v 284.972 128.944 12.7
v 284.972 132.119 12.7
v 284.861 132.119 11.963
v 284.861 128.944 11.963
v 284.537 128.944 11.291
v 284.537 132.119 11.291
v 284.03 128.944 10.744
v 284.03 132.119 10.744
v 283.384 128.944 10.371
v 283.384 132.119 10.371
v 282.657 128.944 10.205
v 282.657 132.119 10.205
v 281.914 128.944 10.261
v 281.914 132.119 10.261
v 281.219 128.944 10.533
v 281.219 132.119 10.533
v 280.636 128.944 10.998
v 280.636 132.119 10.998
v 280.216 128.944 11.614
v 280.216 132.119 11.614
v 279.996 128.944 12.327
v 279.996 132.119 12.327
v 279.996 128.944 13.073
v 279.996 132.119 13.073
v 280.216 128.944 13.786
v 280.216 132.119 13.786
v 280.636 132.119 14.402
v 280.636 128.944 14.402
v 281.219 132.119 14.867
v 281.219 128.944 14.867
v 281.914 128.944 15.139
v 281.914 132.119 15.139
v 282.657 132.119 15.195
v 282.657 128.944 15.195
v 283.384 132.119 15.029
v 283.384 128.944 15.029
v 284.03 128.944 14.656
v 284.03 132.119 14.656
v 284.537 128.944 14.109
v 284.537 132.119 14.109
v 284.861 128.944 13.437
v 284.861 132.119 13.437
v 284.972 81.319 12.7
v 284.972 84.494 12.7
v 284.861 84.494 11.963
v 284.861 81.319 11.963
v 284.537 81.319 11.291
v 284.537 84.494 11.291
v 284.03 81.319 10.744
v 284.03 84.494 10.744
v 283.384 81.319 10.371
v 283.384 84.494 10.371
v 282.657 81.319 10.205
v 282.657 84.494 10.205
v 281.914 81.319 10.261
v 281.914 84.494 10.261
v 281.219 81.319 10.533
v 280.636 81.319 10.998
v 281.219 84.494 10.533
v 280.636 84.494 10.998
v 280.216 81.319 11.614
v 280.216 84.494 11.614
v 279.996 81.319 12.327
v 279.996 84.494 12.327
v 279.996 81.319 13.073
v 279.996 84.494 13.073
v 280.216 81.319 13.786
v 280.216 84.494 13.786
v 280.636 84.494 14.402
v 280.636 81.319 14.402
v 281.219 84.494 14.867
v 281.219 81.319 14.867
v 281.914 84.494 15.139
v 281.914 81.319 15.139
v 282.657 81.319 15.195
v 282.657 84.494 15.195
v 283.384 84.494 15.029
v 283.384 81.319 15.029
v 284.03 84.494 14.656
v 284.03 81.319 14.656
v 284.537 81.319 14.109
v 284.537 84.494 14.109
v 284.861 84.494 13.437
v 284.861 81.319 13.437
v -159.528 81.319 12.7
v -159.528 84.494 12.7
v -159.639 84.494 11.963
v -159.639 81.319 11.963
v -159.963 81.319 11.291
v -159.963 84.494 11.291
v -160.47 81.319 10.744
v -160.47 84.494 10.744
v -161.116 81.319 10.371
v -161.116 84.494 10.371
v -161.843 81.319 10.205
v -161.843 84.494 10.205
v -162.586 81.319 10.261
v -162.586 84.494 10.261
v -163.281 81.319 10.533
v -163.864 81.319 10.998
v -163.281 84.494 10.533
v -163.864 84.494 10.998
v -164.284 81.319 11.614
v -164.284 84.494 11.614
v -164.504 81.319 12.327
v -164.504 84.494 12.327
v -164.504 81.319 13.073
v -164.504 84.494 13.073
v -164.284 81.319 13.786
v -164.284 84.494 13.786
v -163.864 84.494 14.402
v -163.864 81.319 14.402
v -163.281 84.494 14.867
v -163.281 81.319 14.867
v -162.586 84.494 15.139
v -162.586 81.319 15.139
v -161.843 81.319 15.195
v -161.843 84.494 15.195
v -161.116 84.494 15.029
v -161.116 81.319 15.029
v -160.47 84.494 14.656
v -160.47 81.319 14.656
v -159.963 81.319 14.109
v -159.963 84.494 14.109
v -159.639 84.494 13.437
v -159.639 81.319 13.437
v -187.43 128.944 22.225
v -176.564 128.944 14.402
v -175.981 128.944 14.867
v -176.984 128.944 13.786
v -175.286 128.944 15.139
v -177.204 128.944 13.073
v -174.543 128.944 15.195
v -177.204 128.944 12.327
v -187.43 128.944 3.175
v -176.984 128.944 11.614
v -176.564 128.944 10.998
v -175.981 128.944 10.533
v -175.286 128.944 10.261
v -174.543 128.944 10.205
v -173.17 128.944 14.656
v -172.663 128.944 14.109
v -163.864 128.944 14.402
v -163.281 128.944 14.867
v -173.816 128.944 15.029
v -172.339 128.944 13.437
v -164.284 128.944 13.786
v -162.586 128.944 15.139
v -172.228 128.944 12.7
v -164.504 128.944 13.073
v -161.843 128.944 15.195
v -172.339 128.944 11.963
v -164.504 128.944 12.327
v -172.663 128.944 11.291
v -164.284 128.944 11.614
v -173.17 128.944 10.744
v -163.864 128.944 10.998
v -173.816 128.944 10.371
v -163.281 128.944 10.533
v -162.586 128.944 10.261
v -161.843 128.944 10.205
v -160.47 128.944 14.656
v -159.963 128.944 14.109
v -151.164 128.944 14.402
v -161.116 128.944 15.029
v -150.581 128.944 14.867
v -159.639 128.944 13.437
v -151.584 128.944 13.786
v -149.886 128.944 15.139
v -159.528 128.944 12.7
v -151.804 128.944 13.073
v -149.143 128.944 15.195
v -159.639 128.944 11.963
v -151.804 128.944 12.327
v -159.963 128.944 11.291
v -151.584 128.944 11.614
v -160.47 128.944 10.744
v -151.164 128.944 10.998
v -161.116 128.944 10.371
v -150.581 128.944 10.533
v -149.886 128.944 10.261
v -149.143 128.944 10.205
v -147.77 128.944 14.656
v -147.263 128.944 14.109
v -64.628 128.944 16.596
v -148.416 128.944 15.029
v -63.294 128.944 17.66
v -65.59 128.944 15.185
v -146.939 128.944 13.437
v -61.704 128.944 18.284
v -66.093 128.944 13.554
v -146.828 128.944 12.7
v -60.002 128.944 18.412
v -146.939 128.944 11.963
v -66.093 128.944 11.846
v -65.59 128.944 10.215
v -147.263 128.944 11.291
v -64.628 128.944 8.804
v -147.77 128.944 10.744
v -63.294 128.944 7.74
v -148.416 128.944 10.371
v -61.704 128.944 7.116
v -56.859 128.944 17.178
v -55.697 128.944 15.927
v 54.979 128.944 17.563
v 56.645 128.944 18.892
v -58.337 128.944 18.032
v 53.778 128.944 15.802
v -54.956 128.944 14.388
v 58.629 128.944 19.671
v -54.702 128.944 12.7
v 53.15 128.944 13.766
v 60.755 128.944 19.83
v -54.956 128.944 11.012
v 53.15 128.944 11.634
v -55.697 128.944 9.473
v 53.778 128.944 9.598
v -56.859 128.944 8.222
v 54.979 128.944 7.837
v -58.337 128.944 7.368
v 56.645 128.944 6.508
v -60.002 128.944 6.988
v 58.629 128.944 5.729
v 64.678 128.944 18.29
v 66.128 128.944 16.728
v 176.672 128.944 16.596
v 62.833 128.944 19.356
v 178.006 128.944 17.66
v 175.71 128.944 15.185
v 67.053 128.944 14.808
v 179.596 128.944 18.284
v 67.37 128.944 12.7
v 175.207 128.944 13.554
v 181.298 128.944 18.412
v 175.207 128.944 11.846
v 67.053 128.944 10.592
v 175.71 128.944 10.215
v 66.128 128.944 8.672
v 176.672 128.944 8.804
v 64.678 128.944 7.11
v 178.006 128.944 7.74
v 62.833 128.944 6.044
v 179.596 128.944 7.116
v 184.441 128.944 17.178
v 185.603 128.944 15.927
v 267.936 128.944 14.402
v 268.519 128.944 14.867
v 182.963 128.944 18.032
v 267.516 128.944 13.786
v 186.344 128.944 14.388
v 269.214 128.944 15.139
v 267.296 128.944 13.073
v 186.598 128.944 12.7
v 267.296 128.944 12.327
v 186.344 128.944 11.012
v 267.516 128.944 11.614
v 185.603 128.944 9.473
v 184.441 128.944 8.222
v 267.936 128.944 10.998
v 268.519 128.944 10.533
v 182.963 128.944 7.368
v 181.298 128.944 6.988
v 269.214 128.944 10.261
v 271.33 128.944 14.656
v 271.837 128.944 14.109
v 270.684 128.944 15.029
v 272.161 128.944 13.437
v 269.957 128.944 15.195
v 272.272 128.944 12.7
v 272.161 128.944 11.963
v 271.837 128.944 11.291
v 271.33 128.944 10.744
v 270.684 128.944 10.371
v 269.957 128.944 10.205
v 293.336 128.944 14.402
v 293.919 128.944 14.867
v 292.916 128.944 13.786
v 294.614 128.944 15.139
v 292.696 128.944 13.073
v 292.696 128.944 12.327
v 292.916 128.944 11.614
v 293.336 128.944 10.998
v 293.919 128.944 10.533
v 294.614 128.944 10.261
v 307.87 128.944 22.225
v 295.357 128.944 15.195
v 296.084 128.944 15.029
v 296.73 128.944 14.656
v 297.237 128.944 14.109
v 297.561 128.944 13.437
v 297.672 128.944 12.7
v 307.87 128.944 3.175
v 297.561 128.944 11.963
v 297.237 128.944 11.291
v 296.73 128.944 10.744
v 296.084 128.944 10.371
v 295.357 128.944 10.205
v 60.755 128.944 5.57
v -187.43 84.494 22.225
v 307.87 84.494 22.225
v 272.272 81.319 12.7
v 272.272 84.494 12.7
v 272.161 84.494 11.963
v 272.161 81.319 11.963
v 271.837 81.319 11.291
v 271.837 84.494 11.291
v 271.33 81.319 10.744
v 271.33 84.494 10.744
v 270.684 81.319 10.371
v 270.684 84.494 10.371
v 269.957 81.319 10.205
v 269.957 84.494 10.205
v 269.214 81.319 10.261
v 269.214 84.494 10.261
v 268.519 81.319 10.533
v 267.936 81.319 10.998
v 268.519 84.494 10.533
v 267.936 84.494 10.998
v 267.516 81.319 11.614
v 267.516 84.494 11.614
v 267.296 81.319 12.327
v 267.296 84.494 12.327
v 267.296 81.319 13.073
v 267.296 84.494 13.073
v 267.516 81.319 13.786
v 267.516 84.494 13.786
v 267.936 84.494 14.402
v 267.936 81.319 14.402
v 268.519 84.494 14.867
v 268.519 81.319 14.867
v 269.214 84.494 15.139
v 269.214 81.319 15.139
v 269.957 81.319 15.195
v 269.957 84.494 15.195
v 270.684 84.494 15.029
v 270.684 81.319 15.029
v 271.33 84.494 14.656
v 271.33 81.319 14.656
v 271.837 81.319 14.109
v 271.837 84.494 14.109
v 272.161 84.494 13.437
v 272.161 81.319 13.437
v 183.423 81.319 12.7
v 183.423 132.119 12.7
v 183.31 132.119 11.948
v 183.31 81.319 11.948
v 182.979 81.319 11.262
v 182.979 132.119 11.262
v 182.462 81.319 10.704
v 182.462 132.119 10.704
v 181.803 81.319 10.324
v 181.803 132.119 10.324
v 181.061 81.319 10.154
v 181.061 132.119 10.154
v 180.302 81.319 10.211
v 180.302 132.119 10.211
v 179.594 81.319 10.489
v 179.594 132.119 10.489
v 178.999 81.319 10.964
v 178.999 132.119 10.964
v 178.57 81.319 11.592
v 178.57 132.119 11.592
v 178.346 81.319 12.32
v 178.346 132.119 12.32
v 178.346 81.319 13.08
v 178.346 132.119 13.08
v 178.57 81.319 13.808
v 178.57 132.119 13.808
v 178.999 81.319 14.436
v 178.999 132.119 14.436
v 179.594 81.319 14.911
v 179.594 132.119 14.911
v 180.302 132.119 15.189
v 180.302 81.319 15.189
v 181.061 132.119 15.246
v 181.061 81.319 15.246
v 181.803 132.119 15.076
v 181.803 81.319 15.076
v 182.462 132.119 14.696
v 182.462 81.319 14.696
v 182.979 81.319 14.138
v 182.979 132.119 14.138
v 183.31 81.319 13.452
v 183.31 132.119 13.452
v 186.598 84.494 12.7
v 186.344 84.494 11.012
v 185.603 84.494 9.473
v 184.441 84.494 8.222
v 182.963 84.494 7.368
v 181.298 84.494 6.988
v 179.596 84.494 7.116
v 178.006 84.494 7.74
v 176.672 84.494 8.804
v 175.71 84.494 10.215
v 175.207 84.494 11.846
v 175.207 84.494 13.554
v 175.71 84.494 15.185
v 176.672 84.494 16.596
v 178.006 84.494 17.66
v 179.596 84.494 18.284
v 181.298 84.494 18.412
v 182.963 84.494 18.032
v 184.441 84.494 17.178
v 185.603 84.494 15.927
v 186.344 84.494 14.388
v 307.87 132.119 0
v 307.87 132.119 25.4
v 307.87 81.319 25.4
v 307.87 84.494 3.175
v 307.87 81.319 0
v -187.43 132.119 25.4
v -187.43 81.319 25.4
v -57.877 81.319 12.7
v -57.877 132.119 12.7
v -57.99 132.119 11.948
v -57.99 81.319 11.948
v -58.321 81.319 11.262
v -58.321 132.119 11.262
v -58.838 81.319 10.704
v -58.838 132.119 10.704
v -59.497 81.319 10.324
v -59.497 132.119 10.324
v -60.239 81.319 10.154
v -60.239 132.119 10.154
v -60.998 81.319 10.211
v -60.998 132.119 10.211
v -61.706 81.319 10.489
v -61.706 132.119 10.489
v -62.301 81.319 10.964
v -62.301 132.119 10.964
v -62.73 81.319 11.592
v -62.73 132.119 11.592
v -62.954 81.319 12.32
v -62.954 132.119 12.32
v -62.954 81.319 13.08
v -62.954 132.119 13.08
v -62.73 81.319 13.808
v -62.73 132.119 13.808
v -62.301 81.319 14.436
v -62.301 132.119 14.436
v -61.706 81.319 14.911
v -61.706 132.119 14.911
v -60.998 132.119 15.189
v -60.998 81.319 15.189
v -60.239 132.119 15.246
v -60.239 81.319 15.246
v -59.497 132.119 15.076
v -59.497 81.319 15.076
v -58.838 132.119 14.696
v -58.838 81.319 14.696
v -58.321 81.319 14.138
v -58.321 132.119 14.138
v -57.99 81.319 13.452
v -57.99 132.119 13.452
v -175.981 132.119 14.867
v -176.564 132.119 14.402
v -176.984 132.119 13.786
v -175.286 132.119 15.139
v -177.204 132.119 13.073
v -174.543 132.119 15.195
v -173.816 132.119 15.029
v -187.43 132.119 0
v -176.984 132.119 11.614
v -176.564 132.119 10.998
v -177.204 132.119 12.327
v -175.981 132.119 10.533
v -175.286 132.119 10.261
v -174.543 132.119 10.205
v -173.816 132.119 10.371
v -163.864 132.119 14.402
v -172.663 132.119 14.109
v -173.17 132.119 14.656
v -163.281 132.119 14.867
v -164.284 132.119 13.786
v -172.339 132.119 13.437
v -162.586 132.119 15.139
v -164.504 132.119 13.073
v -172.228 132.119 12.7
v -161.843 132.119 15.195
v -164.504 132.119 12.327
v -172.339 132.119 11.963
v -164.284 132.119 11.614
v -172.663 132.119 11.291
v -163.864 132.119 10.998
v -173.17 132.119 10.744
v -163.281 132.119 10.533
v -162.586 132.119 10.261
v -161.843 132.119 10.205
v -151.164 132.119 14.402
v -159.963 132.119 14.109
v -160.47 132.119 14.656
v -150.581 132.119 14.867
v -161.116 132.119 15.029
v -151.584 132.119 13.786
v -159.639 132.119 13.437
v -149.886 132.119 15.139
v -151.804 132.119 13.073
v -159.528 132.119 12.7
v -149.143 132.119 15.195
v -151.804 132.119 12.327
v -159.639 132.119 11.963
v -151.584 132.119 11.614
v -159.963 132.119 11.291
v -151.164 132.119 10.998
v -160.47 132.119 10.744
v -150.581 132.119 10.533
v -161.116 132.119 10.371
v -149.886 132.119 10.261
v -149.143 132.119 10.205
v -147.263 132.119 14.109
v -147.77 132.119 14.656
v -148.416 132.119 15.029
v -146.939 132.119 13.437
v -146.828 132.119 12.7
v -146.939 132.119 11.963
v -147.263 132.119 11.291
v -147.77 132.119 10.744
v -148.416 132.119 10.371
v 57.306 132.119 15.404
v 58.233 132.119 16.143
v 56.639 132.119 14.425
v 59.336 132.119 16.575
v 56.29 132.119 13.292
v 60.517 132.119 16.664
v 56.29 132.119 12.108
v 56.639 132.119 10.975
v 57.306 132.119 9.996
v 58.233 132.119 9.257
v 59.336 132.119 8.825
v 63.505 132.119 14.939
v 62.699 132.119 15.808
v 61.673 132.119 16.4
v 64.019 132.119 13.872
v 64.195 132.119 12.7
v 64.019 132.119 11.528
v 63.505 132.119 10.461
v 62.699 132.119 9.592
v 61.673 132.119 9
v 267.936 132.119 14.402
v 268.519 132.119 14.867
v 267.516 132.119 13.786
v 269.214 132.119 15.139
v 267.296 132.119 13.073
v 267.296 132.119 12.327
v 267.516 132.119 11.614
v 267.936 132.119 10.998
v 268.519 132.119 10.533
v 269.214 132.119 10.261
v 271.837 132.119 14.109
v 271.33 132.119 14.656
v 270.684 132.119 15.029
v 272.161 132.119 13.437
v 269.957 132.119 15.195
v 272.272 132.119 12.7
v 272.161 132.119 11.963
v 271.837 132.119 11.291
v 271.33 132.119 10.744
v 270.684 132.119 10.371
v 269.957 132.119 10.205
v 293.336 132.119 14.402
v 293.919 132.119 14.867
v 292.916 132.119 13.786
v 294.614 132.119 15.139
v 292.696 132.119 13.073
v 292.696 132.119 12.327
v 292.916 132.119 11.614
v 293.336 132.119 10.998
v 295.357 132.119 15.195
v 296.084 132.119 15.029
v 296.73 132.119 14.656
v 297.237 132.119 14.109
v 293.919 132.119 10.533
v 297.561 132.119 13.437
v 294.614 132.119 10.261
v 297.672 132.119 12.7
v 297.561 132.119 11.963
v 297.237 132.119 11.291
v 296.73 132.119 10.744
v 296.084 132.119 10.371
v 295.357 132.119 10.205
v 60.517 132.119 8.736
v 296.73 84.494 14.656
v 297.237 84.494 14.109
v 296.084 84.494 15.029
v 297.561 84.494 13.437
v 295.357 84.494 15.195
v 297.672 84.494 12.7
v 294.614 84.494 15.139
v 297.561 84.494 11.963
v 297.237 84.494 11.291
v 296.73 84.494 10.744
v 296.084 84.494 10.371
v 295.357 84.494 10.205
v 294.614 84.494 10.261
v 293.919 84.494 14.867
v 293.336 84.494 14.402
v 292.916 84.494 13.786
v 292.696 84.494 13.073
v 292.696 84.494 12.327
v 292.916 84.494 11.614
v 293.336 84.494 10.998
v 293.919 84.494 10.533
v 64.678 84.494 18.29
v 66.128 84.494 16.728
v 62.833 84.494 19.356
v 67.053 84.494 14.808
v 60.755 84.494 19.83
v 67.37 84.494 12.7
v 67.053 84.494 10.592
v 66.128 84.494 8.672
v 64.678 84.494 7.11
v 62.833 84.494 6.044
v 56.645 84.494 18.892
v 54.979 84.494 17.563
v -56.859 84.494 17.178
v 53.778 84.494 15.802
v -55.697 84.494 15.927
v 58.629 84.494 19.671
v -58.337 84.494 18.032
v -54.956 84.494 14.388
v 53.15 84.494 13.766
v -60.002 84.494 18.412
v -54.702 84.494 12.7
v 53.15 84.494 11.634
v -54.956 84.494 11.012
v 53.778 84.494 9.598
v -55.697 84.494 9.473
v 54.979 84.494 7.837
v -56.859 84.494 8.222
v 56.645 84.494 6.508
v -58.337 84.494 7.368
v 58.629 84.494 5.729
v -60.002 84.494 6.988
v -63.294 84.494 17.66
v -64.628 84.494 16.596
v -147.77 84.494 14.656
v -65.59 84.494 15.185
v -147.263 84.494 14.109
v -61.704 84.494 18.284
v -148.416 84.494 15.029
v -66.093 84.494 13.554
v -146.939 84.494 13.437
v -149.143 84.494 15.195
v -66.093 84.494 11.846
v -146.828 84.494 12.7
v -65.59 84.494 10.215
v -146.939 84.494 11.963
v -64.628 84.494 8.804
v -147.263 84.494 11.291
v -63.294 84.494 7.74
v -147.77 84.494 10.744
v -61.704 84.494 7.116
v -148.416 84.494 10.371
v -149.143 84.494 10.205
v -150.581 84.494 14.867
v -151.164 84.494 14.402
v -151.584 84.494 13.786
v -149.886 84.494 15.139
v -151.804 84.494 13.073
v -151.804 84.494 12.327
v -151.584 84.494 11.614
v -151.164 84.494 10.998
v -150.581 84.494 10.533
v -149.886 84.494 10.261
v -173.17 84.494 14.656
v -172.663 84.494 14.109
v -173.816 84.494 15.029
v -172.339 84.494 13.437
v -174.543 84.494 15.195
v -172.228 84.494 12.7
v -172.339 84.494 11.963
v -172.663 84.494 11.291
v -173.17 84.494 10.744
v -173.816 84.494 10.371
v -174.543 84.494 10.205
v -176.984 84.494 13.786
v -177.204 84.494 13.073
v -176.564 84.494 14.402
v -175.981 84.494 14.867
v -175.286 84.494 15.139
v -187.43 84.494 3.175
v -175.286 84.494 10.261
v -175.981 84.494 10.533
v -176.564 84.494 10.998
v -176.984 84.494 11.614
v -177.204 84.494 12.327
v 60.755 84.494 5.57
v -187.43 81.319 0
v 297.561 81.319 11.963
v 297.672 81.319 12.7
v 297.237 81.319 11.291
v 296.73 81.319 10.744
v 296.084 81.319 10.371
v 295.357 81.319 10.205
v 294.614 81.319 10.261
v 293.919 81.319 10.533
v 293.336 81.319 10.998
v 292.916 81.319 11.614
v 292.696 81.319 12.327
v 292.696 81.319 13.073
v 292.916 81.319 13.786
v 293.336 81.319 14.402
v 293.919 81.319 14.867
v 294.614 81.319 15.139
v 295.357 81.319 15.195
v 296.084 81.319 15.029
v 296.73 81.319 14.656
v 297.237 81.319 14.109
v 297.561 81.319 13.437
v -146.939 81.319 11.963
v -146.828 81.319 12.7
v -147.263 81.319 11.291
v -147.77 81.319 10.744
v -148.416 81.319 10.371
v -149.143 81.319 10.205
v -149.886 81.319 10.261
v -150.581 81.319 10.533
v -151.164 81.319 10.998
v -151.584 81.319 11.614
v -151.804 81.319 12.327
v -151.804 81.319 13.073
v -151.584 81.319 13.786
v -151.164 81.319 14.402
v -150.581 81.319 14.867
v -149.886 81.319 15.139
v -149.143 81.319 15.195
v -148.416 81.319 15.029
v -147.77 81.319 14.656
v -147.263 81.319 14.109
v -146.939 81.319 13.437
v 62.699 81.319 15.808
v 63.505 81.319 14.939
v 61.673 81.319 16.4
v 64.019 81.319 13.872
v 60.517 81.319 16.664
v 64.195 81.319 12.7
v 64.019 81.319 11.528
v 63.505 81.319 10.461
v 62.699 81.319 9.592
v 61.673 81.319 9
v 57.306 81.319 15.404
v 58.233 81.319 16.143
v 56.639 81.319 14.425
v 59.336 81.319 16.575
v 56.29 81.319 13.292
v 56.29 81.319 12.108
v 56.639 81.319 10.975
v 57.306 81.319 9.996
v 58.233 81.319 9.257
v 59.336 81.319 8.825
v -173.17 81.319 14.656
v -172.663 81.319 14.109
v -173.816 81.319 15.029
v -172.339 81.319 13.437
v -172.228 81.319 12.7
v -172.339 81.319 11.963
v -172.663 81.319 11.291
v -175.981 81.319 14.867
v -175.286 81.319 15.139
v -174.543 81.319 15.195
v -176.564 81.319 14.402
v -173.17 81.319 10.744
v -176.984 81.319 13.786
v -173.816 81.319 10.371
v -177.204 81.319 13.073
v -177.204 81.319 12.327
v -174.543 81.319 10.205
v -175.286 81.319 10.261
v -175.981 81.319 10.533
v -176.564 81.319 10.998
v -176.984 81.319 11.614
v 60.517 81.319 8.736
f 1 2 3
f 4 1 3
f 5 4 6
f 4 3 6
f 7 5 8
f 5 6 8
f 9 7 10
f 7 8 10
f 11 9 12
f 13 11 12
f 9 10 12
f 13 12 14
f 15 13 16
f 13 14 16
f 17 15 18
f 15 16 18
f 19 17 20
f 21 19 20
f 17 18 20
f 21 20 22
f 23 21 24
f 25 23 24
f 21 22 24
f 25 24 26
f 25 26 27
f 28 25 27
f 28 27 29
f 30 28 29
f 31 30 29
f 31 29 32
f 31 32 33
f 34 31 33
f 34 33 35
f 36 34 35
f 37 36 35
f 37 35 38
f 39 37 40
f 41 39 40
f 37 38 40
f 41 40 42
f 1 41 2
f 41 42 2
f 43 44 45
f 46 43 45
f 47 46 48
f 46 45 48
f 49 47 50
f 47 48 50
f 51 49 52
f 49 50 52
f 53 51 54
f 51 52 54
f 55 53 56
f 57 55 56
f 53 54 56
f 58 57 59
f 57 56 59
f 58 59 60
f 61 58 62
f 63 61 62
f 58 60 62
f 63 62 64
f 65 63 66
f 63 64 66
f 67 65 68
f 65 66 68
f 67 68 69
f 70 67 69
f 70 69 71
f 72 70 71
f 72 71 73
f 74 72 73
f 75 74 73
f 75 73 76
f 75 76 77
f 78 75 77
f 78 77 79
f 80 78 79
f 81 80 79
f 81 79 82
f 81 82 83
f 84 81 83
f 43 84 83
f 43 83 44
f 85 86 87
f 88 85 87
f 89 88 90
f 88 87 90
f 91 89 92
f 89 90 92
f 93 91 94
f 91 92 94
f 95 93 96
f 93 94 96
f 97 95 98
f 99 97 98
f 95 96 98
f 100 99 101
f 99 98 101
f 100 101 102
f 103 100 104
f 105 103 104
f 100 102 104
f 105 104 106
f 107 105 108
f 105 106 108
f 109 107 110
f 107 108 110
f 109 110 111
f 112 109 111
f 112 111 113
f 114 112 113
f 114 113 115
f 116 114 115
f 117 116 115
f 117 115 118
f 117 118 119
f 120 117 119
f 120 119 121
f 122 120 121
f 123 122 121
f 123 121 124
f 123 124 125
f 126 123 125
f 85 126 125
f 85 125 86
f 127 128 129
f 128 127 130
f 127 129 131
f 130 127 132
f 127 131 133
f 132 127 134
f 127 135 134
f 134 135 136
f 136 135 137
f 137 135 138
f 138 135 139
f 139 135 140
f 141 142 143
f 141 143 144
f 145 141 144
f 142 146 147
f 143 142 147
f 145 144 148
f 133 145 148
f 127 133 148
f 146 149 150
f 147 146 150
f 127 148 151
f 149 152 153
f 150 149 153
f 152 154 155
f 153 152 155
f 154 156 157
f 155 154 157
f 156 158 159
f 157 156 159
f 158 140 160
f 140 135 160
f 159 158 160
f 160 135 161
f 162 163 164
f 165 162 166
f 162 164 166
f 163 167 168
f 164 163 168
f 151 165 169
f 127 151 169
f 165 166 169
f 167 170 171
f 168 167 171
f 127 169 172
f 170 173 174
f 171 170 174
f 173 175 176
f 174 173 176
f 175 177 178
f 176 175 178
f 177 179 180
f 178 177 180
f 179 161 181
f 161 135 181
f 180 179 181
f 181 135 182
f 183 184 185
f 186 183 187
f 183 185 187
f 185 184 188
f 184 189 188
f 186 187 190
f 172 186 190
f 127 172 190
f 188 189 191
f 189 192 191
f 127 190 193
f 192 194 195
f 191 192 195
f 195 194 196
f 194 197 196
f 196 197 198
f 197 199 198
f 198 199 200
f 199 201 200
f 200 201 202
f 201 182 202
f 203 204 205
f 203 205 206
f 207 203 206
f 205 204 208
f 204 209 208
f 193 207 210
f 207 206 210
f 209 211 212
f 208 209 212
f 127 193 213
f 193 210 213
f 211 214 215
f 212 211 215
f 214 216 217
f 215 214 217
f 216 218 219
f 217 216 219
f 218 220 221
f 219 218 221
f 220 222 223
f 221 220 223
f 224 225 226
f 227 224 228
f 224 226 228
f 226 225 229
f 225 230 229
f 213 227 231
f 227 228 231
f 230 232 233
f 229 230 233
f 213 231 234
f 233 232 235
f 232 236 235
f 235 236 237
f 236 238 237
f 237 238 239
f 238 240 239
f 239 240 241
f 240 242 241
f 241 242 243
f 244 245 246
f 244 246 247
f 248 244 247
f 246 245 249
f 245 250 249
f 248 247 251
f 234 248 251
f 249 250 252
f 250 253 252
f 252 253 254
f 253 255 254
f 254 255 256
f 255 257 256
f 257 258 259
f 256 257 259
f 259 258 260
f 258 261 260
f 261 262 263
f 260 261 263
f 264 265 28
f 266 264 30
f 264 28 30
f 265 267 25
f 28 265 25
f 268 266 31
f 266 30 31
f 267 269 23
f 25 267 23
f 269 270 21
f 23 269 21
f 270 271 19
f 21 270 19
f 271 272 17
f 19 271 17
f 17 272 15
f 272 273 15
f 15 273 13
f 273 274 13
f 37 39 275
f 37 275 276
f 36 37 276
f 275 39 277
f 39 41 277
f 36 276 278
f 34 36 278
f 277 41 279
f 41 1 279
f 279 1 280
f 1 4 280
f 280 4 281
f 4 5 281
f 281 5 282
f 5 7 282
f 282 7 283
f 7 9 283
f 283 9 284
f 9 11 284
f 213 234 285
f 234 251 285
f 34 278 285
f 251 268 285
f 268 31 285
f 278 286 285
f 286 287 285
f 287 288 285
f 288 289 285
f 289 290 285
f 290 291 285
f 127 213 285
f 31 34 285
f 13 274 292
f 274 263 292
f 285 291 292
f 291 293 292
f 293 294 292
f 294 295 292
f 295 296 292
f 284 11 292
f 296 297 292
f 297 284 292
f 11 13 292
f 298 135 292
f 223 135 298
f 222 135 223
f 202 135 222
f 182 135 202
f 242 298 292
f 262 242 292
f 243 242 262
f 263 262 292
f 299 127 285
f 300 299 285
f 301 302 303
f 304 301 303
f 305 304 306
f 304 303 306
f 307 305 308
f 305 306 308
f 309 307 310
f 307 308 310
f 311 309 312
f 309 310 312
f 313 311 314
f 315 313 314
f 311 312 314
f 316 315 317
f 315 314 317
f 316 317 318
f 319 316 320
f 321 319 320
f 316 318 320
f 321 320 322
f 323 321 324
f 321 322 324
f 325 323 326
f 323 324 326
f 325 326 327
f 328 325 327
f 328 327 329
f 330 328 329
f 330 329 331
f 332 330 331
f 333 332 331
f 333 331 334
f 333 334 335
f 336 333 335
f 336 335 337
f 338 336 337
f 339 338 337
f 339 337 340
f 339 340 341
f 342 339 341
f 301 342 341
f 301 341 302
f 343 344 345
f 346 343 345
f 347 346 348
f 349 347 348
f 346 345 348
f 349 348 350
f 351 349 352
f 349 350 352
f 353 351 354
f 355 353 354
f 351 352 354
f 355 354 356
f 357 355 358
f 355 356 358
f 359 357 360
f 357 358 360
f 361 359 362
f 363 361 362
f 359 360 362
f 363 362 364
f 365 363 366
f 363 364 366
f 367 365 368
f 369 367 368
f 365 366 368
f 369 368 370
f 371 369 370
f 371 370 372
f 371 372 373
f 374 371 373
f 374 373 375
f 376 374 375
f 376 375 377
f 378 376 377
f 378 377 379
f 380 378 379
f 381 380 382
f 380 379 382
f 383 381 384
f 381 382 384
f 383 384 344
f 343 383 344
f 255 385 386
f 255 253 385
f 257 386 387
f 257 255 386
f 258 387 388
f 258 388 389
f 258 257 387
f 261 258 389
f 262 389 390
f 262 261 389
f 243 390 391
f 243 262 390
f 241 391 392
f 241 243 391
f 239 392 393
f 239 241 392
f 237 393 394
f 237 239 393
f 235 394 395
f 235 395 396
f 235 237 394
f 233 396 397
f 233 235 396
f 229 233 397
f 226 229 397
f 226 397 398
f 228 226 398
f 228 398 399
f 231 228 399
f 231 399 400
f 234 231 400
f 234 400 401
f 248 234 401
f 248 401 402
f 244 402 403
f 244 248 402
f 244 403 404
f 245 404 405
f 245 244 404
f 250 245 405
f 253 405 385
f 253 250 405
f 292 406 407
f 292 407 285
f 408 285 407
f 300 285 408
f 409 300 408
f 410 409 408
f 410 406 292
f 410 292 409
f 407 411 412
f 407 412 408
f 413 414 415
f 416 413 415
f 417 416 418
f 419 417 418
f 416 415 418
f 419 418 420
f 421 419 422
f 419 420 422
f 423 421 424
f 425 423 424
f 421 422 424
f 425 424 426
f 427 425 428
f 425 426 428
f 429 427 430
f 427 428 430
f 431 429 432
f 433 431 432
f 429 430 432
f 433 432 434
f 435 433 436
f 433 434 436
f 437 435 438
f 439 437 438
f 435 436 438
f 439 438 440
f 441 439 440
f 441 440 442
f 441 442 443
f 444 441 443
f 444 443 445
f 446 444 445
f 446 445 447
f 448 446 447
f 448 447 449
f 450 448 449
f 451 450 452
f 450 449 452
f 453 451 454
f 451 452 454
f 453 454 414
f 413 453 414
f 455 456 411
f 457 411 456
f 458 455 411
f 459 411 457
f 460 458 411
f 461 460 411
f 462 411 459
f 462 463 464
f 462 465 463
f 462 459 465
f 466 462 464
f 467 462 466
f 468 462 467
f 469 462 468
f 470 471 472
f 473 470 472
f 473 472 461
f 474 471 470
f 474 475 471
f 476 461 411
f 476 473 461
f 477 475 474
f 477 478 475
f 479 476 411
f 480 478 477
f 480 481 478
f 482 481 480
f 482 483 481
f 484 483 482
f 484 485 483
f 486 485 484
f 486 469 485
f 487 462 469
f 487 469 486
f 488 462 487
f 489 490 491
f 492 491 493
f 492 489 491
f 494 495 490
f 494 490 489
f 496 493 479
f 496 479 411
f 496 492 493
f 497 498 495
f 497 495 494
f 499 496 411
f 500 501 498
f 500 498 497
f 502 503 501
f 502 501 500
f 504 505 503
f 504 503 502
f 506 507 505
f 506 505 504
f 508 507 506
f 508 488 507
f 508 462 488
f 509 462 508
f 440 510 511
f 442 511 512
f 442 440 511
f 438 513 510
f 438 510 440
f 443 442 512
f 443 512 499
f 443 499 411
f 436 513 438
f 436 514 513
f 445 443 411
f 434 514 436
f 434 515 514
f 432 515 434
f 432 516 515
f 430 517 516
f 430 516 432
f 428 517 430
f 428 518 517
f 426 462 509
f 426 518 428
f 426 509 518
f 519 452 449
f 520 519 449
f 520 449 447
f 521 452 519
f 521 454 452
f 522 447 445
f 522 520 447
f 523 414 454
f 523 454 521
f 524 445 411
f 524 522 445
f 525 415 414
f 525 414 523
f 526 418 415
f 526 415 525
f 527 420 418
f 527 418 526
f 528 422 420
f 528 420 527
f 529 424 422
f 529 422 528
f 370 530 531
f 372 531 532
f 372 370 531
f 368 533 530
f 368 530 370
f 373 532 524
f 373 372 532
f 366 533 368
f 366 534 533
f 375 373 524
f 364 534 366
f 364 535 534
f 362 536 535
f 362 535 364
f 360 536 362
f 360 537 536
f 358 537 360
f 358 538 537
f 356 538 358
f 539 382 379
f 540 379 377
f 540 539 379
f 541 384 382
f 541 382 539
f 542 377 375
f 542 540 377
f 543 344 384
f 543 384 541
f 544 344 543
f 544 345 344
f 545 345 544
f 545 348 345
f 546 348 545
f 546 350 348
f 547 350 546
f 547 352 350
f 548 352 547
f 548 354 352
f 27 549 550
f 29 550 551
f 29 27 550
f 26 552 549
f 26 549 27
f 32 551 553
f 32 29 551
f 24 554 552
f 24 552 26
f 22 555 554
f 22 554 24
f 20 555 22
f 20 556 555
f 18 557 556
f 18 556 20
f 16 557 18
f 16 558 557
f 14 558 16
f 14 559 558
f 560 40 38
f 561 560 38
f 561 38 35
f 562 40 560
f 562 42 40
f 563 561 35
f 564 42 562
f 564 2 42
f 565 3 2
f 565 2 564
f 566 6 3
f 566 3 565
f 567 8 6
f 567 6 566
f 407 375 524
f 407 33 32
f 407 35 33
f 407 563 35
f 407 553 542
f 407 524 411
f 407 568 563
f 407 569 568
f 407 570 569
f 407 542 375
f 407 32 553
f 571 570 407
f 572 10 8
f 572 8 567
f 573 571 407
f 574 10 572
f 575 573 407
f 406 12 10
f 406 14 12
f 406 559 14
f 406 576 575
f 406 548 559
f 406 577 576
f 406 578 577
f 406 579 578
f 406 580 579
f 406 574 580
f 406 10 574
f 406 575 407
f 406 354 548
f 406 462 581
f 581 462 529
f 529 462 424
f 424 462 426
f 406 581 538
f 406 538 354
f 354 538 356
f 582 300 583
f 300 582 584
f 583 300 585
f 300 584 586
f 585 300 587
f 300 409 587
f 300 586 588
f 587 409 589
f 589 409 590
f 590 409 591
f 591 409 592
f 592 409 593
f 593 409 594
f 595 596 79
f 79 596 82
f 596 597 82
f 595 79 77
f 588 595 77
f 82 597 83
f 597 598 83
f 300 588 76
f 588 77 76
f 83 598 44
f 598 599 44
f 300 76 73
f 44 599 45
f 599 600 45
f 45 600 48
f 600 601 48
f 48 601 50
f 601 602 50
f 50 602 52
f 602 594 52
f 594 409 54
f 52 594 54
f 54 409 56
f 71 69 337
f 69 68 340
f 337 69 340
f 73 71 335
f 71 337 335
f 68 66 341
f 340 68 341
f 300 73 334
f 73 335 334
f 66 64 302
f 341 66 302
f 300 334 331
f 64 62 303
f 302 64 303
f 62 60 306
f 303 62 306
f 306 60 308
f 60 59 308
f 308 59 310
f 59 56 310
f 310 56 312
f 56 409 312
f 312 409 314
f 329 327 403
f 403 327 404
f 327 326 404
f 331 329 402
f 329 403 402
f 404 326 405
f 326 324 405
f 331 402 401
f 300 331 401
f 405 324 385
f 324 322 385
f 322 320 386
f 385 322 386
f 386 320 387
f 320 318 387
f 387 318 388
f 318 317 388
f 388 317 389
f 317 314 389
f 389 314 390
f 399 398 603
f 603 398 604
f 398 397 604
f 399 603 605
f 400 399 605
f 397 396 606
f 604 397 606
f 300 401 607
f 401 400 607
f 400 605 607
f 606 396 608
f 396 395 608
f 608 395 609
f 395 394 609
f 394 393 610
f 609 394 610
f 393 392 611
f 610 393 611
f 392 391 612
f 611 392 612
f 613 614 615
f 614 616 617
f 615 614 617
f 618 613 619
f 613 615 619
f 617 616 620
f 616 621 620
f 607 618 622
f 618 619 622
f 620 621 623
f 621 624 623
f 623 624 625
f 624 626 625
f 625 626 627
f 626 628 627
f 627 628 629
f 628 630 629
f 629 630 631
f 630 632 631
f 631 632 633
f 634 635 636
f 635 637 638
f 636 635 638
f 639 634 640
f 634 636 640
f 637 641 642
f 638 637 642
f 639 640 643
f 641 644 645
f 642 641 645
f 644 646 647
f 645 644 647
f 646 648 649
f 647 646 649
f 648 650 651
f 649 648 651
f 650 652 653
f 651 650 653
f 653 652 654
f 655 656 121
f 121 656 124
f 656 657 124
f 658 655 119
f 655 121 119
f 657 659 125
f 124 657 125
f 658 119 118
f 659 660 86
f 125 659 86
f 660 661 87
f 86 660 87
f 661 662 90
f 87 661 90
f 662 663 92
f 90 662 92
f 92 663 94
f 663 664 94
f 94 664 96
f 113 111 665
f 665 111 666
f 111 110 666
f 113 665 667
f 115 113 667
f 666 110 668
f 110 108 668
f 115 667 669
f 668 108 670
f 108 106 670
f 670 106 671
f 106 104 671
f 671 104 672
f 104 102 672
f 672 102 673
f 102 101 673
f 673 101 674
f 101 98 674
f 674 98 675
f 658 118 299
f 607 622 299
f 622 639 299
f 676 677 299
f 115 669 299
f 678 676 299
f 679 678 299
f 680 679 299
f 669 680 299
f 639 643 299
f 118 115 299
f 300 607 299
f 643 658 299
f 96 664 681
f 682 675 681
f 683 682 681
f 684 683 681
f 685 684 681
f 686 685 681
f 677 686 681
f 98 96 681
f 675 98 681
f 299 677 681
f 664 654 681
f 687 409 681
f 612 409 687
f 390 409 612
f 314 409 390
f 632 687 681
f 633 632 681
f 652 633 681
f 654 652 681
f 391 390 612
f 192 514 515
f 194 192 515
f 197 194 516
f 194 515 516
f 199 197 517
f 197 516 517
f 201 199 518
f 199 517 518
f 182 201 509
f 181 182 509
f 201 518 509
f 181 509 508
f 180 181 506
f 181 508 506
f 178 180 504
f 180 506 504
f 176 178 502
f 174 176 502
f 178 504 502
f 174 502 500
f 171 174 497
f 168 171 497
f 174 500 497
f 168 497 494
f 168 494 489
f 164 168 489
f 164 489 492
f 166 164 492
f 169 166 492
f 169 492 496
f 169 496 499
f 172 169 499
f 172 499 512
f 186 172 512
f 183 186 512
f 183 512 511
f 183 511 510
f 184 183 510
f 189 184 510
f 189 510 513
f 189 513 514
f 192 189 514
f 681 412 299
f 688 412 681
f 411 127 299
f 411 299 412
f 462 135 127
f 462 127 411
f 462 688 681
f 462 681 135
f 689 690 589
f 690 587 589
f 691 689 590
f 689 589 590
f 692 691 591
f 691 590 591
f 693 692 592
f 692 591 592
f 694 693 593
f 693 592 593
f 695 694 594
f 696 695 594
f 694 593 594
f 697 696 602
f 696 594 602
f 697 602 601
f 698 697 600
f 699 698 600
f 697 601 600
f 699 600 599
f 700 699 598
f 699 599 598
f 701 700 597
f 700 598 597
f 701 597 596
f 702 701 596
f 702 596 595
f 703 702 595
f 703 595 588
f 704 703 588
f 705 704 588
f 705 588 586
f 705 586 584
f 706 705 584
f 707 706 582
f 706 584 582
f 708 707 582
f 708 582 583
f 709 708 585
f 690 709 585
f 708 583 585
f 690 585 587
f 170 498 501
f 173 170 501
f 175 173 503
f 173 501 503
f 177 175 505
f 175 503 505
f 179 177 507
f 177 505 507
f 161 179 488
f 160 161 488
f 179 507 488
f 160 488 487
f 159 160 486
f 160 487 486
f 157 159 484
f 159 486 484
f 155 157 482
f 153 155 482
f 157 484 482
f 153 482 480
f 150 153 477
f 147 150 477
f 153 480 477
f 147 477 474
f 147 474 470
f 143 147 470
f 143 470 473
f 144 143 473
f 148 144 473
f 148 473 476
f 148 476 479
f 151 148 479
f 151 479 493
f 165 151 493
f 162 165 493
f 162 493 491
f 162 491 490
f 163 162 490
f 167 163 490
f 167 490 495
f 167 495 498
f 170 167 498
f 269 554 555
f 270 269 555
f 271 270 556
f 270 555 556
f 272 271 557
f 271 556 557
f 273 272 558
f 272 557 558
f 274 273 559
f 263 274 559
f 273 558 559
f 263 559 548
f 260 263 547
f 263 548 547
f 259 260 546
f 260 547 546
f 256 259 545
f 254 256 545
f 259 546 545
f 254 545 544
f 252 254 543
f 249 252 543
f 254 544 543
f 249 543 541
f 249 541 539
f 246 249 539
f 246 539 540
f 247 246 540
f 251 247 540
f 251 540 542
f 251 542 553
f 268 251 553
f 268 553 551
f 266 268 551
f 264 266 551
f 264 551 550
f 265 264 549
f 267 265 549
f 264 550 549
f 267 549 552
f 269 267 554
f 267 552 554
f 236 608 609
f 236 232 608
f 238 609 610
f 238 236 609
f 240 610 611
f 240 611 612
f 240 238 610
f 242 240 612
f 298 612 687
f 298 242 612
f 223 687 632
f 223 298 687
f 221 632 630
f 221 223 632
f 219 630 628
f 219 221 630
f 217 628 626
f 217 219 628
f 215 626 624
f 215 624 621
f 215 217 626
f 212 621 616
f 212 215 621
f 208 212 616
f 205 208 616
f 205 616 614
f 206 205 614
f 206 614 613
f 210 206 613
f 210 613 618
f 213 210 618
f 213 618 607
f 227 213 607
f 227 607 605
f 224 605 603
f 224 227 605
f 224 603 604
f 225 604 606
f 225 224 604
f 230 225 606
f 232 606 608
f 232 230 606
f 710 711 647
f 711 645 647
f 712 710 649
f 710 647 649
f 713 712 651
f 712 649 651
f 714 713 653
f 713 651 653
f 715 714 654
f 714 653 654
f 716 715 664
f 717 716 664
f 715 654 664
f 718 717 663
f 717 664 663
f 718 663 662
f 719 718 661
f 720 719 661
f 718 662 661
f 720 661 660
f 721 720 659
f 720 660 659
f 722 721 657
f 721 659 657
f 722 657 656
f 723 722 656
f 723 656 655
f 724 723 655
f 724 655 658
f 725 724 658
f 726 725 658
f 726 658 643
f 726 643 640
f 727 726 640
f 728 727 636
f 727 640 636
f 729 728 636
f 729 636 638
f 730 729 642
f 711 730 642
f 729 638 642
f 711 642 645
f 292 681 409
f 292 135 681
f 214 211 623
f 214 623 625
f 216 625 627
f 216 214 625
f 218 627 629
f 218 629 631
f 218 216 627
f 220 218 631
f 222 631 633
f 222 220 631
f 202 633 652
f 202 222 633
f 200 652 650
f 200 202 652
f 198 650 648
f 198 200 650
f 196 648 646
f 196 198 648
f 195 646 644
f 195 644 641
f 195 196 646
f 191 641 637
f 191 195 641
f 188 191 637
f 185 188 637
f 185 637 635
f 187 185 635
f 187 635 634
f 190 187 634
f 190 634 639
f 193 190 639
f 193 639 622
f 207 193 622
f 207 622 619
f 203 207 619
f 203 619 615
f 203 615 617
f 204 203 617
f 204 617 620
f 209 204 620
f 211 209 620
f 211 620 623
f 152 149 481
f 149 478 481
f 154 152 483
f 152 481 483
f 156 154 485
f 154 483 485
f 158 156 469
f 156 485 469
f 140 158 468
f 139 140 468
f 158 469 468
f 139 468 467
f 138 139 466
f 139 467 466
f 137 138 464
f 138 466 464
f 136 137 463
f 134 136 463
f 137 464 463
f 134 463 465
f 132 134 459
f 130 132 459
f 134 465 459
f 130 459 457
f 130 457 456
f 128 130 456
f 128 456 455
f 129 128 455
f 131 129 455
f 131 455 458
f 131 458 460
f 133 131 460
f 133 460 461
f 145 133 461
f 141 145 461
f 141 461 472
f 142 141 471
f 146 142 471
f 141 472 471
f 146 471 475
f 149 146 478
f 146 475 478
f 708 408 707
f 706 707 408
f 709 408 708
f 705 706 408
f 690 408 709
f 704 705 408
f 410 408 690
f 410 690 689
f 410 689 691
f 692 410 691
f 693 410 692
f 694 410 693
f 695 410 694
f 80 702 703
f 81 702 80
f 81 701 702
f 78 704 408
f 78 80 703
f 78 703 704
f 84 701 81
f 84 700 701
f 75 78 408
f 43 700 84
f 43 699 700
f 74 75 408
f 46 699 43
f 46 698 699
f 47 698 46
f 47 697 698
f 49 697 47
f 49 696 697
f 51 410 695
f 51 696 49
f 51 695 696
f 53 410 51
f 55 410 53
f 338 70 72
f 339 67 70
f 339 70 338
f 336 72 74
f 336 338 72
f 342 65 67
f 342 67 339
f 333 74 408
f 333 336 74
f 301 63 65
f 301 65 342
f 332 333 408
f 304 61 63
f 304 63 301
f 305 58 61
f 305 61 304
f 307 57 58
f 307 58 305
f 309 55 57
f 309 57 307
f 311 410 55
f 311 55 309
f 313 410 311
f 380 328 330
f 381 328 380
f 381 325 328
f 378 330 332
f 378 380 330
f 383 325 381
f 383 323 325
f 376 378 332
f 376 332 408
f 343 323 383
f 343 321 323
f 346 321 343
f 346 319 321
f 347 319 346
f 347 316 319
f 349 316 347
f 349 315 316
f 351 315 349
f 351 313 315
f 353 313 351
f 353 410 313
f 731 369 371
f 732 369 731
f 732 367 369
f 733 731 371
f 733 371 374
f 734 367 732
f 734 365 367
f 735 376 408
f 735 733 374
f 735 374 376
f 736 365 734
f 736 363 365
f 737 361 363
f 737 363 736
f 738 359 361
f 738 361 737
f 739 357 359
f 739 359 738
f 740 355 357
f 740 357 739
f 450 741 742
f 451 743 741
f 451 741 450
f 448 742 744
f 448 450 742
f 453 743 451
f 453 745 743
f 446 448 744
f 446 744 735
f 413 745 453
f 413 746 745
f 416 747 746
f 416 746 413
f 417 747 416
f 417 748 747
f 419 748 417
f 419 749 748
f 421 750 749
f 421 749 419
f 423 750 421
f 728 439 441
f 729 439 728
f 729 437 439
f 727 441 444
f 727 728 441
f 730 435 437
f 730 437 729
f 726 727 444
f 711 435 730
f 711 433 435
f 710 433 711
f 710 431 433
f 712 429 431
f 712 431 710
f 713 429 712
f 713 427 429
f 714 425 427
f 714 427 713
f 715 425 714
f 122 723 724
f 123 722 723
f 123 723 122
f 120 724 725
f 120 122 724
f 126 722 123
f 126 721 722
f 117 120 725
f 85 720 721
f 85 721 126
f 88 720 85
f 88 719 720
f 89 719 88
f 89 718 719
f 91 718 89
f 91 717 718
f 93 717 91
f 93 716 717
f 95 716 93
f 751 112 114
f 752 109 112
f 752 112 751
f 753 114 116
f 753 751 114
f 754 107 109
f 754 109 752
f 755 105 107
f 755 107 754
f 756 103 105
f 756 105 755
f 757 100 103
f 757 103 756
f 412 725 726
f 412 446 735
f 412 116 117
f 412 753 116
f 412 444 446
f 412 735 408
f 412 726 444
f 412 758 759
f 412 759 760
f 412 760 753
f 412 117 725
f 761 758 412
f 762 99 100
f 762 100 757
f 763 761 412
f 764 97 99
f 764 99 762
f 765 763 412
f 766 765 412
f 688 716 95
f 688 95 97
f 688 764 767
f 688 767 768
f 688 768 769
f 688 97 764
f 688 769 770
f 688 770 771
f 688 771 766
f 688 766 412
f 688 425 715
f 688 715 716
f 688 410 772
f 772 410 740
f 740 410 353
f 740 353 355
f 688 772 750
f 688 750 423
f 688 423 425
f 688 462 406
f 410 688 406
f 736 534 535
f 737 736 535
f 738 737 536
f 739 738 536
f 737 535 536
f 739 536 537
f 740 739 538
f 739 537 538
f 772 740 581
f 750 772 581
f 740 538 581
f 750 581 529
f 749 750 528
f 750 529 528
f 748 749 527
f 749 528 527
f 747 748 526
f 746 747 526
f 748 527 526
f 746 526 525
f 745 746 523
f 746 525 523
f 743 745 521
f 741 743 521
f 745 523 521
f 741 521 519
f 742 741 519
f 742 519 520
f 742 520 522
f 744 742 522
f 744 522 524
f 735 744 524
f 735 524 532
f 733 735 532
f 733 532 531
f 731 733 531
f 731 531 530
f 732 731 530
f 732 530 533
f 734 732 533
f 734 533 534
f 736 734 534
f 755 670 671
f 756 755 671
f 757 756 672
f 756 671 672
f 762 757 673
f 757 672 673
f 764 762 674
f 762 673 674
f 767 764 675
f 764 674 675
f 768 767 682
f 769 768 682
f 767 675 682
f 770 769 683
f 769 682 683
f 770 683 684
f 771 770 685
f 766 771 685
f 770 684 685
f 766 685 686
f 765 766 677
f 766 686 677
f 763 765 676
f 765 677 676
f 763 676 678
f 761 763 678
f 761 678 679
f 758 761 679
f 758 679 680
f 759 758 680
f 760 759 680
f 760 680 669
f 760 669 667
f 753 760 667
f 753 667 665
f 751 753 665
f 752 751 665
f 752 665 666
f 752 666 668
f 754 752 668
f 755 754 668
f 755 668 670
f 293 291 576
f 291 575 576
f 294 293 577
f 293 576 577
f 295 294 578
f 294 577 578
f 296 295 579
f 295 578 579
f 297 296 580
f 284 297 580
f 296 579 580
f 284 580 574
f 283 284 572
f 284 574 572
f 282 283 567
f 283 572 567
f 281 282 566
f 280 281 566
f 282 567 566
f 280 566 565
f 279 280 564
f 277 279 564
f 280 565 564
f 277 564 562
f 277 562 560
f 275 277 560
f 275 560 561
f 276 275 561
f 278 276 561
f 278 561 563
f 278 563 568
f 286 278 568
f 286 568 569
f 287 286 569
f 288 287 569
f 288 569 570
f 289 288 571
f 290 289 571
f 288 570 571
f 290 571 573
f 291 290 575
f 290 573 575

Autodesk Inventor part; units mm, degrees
ref_plane "YZ Plane" through (0, 0, 0) normal (1, 0, 0) x (0, 1, 0)
ref_plane "XZ Plane" through (0, 0, 0) normal (0, 1, 0) x (-1, 0, 0)
ref_plane "XY Plane" through (0, 0, 0) normal (0, 0, 1) x (1, 0, 0)
sketch "Sketch1" plane through (0, 0, 0) normal (0, 0, 1) x (1, 0, 0)
  line L0 (-187.4297, 132.1193) -> (307.8703, 132.1193)
  line L1 (307.8703, 132.1193) -> (307.8703, 81.3193)
  line L2 (307.8703, 81.3193) -> (-187.4297, 81.3193)
  line L3 (-187.4297, 81.3193) -> (-187.4297, 132.1193)
  point P0 (0, 0)
  dimension "d0" = 495.3
  dimension "d1" = 50.8
extrude "Extrusion1" add sketch "Sketch1" along normal blind 25.4
sketch "Sketch2" plane through (-187.4297, 132.1193, 0) normal (0, 1, 0) x (1, 0, 0)
  circle A0 centre (12.7, -12.7) radius 2.5019
  line L0 (0, 0) -> (0, -25.4) projected
  circle A1 centre (25.4, -12.7) radius 2.5019
  circle A2 centre (38.1, -12.7) radius 2.5019
  circle A3 centre (482.6, -12.7) radius 2.5019
  line L1 (495.3, 0) -> (495.3, -25.4) projected
  circle A4 centre (469.9, -12.7) radius 2.5019
  circle A5 centre (457.2, -12.7) radius 2.5019
  circle A6 centre (368.3, -12.7) radius 2.5527
  circle A7 centre (247.65, -12.7) radius 3.9751
  line L2 (495.3, 0) -> (0, 0) projected
  circle A8 centre (127, -12.7) radius 2.5527
  point P0 (187.4297, 0)
  dimension "d4" = 12.7
  dimension "d5" = 5.0038
  dimension "d6" = 5.0038
  dimension "d7" = 5.0038
  dimension "d8" = 12.7
  dimension "d9" = 12.7
  dimension "d10" = 5.0038
  dimension "d11" = 12.7
  dimension "d12" = 5.0038
  dimension "d13" = 5.0038
  dimension "d14" = 12.7
  dimension "d15" = 12.7
  dimension "d19" = 127
  dimension "d20" = 5.1054
  dimension "d23" = 7.9502
  dimension "d24" = 247.65
  dimension "d25" = 12.7
  dimension "d26" = 5.1054
  dimension "d27" = 127
extrude "Extrusion2" cut sketch "Sketch2" against normal blind 50.8
shell "Shell1" thickness 3.175 removed faces 8 at (-187.4297, 115.186, 16.9333) at (307.8703, 98.2527, 8.4667) at (295.0696, 98.2527, 10.2001) at (282.3696, 98.2527, 10.2001) at (269.6696, 98.2527, 10.2001) at (-149.4304, 98.2527, 10.2001) at (-162.1304, 98.2527, 10.2001) at (-174.8304, 98.2527, 10.2001)
properties part number "(b)swerveassembly" material "Aluminum 6061"
